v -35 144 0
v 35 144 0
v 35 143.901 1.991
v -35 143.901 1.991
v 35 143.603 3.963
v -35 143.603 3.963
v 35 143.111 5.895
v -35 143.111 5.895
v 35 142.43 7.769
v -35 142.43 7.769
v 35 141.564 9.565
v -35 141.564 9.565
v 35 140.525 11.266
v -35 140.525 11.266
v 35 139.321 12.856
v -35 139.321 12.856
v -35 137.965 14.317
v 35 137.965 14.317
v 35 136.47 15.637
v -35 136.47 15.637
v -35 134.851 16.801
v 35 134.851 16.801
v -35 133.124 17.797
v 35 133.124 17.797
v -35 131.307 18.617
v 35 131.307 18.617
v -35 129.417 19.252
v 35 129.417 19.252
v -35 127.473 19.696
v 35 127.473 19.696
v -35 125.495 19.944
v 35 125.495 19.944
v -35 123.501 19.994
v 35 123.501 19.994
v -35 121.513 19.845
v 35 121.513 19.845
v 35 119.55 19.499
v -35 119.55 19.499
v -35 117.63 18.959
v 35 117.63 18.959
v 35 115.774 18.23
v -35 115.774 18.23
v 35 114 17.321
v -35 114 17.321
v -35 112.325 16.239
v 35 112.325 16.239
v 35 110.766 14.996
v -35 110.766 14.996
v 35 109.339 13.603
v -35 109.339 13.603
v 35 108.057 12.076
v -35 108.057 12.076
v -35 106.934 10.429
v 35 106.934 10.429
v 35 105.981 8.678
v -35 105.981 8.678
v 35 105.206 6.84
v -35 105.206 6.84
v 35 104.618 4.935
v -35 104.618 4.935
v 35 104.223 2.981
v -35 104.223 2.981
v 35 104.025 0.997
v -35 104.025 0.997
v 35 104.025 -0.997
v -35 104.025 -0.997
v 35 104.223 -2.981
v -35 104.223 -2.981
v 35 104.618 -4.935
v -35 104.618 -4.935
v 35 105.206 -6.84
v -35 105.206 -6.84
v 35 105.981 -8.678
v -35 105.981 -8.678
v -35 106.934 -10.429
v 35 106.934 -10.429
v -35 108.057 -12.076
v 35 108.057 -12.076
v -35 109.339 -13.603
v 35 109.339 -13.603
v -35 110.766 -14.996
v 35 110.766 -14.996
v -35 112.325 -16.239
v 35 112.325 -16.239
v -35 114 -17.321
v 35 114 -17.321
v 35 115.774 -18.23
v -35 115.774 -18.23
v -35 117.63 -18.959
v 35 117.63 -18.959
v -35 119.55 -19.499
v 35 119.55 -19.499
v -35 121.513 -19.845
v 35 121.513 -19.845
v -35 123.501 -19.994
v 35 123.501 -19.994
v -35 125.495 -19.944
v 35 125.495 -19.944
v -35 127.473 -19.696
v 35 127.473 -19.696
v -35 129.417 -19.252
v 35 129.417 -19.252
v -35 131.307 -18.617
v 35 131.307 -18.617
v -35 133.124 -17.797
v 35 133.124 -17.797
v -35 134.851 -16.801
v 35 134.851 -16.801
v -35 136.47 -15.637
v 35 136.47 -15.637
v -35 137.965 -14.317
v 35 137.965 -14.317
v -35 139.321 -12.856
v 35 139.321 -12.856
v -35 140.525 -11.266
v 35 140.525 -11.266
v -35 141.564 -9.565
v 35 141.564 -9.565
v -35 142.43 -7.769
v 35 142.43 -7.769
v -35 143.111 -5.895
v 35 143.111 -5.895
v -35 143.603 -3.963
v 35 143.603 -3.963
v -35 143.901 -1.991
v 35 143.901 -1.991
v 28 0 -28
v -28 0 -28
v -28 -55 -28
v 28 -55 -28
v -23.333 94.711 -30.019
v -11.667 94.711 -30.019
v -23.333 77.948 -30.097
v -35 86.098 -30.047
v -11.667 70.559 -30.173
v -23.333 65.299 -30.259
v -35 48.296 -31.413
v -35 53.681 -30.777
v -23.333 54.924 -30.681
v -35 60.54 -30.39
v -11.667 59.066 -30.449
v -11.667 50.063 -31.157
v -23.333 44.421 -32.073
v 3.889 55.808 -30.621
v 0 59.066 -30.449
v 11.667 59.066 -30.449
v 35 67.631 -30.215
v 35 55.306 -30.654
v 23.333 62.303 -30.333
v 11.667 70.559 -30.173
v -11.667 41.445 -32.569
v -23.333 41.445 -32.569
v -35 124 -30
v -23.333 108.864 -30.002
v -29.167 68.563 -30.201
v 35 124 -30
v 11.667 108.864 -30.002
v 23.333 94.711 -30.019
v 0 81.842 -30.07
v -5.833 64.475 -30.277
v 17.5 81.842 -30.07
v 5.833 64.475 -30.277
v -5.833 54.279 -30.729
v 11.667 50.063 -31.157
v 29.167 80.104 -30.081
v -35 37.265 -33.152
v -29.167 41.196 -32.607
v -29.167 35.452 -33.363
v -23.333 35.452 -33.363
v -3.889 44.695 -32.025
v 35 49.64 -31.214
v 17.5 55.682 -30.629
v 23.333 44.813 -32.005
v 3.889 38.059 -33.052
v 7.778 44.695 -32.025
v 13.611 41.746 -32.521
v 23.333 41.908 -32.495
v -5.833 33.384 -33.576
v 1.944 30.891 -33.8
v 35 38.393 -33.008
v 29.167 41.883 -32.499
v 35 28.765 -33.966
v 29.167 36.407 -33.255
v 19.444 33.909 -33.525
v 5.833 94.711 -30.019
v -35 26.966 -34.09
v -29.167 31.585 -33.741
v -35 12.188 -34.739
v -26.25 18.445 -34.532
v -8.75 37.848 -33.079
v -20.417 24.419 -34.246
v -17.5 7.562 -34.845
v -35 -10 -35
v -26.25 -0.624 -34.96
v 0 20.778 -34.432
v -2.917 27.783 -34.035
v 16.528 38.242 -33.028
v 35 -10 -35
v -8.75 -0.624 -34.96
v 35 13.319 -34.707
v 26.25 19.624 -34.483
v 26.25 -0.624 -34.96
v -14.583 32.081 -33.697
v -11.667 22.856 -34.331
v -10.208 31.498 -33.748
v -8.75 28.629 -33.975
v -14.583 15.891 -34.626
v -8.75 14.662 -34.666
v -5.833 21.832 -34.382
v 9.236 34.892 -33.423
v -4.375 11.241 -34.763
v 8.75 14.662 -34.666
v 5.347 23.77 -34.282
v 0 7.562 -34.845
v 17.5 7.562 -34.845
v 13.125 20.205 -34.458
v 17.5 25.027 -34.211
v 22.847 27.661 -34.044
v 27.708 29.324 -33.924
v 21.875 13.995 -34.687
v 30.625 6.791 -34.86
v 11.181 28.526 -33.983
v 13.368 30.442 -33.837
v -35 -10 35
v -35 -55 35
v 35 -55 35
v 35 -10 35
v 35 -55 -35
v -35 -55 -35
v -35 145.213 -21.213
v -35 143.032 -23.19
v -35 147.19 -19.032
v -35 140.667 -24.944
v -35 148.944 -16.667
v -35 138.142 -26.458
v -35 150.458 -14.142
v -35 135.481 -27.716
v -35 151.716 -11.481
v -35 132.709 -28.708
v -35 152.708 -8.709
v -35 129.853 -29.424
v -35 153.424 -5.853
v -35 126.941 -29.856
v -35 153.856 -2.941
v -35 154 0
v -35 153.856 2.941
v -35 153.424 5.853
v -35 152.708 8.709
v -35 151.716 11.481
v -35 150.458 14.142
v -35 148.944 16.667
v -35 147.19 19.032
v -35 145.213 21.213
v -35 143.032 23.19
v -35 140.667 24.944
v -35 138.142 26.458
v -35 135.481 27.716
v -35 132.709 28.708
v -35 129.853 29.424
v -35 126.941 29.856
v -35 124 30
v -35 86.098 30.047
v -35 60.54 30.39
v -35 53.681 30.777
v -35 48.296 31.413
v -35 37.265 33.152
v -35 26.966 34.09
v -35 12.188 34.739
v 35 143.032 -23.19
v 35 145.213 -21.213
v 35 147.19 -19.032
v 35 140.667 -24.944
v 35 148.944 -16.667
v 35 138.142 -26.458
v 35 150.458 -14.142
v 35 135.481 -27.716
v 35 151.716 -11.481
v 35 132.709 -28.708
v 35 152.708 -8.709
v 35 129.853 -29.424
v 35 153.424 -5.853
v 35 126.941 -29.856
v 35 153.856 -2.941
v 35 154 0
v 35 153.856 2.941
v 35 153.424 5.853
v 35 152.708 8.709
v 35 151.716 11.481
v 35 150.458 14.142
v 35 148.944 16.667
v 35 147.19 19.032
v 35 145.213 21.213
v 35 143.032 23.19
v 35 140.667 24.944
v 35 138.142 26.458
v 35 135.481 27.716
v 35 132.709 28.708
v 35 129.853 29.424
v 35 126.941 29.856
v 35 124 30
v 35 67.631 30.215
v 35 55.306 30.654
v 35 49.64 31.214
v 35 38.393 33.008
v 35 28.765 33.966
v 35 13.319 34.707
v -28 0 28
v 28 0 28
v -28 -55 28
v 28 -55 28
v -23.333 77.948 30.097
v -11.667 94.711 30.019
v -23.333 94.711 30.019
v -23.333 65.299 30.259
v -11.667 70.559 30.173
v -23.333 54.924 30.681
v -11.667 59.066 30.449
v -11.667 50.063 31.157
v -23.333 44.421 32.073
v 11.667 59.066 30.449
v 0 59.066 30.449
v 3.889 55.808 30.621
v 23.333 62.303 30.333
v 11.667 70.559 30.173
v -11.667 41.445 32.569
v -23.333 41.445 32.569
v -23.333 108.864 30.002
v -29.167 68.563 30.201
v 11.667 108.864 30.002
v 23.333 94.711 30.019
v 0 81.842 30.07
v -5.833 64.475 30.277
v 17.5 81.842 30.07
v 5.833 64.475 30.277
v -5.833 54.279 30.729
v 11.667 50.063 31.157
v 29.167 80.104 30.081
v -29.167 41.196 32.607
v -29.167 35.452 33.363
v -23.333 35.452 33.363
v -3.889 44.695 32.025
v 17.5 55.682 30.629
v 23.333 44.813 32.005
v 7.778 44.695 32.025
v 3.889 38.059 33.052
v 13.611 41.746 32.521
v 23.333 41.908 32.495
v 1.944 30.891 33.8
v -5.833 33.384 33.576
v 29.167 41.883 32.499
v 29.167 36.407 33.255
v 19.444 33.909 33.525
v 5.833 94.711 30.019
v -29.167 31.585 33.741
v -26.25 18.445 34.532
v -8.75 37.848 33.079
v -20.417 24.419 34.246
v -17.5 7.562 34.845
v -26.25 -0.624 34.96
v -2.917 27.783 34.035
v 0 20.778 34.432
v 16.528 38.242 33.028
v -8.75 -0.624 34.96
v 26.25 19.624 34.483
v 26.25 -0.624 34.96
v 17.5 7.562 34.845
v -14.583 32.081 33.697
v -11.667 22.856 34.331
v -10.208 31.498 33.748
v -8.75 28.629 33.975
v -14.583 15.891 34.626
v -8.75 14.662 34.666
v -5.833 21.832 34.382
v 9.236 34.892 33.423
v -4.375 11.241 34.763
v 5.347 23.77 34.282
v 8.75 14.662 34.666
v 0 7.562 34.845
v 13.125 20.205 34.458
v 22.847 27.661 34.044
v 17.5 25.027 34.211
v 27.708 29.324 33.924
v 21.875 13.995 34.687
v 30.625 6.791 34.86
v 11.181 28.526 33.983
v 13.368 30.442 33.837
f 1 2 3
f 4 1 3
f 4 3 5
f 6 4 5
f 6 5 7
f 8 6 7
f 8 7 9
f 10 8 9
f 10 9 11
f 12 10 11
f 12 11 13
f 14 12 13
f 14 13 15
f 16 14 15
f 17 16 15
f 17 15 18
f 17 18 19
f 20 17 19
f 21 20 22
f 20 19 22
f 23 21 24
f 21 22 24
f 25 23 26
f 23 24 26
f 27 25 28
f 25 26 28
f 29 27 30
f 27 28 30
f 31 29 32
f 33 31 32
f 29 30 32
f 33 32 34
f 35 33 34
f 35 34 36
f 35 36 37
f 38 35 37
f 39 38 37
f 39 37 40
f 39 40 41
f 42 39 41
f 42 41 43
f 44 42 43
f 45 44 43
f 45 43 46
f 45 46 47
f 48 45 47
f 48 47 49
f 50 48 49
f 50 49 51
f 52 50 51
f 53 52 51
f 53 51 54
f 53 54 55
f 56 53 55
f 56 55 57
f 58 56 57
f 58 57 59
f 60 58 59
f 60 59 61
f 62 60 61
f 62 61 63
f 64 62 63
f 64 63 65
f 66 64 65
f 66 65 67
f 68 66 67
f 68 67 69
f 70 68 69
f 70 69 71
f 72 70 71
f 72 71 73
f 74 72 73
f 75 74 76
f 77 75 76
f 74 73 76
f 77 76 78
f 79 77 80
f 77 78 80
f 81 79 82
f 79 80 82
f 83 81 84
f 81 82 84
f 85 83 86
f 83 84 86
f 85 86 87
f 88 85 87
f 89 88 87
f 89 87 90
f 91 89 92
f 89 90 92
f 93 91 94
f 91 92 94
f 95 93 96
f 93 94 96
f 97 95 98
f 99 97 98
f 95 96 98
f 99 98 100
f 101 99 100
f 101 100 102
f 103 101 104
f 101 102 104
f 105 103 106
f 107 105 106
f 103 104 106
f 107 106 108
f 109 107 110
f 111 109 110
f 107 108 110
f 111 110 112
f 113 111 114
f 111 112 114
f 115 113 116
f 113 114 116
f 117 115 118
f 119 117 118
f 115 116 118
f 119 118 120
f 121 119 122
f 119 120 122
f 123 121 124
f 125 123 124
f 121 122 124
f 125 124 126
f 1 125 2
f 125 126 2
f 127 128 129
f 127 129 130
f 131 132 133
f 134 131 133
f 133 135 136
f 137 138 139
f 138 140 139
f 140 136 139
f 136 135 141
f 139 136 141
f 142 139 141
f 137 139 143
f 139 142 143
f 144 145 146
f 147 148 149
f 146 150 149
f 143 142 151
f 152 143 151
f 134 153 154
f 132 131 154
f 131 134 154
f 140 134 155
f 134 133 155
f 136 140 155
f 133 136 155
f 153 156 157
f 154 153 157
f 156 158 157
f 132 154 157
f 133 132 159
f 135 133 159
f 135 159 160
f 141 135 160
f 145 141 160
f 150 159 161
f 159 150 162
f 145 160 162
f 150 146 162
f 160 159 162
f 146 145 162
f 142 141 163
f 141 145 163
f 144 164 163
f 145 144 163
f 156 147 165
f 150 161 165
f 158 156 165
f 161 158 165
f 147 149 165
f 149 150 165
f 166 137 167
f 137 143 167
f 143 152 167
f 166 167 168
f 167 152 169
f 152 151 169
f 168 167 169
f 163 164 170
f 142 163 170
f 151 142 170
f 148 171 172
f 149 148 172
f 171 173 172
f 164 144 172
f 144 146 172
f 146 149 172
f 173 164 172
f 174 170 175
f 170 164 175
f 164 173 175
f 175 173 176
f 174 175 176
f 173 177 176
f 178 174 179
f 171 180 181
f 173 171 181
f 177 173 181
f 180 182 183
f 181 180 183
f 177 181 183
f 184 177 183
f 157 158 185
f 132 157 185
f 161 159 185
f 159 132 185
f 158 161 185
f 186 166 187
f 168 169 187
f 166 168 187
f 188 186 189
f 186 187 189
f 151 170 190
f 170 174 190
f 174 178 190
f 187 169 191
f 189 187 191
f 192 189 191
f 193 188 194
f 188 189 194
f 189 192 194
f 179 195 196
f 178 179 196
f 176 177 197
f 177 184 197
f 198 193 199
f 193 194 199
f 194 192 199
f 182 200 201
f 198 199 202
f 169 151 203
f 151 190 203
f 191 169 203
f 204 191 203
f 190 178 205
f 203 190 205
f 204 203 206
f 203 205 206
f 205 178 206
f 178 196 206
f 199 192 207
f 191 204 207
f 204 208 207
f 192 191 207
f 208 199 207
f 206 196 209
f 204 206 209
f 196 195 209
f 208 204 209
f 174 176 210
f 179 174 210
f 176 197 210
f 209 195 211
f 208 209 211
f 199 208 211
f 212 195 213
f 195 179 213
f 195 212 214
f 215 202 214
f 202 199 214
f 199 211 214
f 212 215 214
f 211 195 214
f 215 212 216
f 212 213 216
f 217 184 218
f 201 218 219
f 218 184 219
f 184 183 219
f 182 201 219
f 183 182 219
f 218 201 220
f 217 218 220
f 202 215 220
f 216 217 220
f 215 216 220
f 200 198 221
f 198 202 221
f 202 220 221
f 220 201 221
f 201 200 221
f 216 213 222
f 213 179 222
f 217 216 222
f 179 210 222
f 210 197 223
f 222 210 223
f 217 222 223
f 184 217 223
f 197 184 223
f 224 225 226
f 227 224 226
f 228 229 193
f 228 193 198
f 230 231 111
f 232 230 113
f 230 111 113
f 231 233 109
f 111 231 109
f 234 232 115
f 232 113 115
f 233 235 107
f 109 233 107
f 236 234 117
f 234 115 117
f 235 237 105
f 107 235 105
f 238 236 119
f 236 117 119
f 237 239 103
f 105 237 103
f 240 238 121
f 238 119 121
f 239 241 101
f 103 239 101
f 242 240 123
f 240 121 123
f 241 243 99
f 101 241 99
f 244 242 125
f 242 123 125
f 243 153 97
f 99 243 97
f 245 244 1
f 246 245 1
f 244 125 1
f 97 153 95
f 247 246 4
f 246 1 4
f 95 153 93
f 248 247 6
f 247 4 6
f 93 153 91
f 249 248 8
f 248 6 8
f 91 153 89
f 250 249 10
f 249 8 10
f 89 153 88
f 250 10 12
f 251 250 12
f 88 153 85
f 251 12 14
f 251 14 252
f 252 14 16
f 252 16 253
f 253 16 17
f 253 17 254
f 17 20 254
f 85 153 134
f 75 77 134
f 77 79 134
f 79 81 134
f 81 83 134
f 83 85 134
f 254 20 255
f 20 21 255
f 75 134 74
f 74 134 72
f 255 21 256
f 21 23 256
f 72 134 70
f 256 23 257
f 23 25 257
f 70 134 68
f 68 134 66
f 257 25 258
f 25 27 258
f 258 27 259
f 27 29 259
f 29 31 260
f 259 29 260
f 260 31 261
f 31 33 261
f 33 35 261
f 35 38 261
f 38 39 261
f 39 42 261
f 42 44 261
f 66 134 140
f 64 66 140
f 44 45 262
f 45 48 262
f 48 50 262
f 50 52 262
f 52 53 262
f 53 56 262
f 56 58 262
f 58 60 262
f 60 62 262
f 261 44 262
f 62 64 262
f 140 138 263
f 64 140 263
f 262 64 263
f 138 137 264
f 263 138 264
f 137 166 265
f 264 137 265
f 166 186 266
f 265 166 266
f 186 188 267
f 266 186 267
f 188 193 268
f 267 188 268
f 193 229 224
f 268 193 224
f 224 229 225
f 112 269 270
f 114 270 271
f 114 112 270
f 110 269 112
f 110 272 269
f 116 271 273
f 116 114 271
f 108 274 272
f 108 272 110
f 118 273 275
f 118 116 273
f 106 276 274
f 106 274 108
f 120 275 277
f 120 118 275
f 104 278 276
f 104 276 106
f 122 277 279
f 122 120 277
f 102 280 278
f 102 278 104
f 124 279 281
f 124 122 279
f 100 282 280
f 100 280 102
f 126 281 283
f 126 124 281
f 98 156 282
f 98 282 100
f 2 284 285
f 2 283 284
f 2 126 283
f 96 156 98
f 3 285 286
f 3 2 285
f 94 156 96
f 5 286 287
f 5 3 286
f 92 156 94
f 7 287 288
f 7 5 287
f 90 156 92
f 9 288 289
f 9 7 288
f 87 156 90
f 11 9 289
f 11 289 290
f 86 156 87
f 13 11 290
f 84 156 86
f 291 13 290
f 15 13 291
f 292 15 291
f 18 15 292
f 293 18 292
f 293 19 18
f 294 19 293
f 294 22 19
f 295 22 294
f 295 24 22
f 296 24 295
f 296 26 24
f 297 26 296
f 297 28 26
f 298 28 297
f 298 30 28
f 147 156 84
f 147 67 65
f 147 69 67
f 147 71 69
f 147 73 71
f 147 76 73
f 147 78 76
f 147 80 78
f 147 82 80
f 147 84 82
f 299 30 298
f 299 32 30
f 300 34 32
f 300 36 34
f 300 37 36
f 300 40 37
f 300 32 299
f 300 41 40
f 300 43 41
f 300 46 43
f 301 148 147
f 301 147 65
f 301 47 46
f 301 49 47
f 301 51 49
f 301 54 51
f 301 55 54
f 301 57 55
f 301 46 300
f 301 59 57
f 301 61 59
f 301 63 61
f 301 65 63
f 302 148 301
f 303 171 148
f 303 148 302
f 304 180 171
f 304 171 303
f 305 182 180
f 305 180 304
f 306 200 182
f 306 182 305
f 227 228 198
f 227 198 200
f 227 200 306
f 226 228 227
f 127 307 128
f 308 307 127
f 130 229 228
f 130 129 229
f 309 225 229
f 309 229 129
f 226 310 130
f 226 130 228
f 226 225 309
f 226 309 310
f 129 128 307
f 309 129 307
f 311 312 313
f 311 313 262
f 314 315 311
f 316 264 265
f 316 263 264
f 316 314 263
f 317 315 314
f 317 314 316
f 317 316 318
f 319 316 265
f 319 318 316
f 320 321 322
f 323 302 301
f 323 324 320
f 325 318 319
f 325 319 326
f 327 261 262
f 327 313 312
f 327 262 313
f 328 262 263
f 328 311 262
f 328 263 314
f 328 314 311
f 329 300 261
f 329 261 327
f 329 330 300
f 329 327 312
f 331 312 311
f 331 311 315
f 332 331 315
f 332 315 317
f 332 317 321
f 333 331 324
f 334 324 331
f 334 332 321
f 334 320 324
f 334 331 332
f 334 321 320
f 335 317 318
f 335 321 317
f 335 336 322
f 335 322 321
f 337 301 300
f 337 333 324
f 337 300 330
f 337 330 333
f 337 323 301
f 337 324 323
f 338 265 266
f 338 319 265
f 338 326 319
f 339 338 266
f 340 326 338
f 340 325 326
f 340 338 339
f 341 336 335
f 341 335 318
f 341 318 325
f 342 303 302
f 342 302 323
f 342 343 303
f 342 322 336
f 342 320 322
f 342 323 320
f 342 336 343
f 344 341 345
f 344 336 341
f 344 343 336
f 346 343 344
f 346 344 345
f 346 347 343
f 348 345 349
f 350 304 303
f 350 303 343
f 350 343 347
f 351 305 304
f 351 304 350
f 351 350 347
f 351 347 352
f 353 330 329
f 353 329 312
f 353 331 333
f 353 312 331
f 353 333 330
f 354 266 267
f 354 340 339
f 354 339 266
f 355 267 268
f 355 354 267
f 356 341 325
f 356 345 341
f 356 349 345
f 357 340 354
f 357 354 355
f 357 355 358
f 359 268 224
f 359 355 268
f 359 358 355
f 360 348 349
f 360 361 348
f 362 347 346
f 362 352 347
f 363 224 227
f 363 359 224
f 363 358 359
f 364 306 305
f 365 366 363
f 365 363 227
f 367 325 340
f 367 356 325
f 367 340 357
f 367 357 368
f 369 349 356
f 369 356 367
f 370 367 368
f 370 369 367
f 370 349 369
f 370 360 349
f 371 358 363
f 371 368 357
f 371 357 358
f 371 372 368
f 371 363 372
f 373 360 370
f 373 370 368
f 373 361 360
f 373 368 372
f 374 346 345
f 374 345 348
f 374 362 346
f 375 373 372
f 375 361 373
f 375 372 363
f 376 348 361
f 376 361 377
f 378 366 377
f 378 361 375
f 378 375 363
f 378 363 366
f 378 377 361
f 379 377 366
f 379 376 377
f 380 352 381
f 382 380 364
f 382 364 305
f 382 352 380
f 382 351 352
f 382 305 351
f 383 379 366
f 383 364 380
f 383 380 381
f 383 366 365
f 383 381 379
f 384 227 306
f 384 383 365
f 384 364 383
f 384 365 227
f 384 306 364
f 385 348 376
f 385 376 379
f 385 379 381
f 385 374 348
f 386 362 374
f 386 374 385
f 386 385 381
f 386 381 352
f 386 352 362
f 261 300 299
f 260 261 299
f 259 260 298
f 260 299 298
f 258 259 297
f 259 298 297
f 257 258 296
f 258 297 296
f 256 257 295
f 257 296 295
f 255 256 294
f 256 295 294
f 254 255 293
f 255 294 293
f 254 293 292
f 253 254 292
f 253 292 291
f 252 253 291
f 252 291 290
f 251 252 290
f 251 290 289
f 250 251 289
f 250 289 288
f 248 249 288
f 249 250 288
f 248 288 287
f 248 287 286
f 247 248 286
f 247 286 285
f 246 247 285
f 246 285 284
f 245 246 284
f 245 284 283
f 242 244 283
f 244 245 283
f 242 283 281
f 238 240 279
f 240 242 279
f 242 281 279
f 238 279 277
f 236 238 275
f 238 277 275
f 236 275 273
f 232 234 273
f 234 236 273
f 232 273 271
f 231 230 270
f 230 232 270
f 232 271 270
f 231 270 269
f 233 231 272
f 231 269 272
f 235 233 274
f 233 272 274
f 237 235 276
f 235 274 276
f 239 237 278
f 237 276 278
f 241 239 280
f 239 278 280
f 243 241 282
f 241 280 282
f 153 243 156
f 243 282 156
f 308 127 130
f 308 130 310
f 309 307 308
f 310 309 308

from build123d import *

# Parameters (mm, degrees)
F0_W     = 70
F0_H     = 70
F0_W_2   = 56
F0_H_2   = 56
F1_DEPTH = 55
F2_DEPTH = 380
F3_R     = 20
F4_DEPTH = 70.001


with BuildPart() as f1:
    # F0 (on Front) → F1 (new body)
    with BuildSketch(Plane.XZ):
        Rectangle(F0_W, F0_H)
        Rectangle(F0_W_2, F0_H_2, mode=Mode.SUBTRACT)
    extrude(amount=F1_DEPTH)

    # F0 (on Front) → F2 (join)
    with BuildSketch(Plane.XZ):
        Rectangle(F0_W, F0_H)
        Rectangle(F0_W_2, F0_H_2, mode=Mode.SUBTRACT)
        Rectangle(F0_W_2, F0_H_2)
    extrude(amount=-F2_DEPTH)

    # F3 (on face) → F4 (cut, through all)
    with BuildSketch(Plane.YZ.offset(35)):
        with BuildLine():
            ThreePointArc((124, 30), (145.2132034356, 21.2132034356), (154, 0))
            ThreePointArc((154, 0), (145.2132034356, -21.2132034356), (124, -30))
            add(Edge.make_bspline(
                [(124, -30), (103.2983378934, -30), (72.7074229784, -29.9876599501), (43.9366263473, -30.7832092477), (36.1074860936, -35), (-10, -35)],
                knots=[0, 0, 0, 0, 0.3730126835, 0.6041485586, 1, 1, 1, 1], degree=3))
            Line((-10, -35), (380, -35))
            Line((380, -35), (380, 35))
            Line((380, 35), (-10, 35))
            add(Edge.make_bspline(
                [(124, 30), (103.2983378934, 30), (72.7074229784, 29.9876599501), (43.9366263473, 30.7832092477), (36.1074860936, 35), (-10, 35)],
                knots=[0, 0, 0, 0, 0.3730126835, 0.6041485586, 1, 1, 1, 1], degree=3))
        make_face()
        with Locations((124, 0)):
            Circle(F3_R)
    extrude(amount=-F4_DEPTH, mode=Mode.SUBTRACT)


solid = f1.part
